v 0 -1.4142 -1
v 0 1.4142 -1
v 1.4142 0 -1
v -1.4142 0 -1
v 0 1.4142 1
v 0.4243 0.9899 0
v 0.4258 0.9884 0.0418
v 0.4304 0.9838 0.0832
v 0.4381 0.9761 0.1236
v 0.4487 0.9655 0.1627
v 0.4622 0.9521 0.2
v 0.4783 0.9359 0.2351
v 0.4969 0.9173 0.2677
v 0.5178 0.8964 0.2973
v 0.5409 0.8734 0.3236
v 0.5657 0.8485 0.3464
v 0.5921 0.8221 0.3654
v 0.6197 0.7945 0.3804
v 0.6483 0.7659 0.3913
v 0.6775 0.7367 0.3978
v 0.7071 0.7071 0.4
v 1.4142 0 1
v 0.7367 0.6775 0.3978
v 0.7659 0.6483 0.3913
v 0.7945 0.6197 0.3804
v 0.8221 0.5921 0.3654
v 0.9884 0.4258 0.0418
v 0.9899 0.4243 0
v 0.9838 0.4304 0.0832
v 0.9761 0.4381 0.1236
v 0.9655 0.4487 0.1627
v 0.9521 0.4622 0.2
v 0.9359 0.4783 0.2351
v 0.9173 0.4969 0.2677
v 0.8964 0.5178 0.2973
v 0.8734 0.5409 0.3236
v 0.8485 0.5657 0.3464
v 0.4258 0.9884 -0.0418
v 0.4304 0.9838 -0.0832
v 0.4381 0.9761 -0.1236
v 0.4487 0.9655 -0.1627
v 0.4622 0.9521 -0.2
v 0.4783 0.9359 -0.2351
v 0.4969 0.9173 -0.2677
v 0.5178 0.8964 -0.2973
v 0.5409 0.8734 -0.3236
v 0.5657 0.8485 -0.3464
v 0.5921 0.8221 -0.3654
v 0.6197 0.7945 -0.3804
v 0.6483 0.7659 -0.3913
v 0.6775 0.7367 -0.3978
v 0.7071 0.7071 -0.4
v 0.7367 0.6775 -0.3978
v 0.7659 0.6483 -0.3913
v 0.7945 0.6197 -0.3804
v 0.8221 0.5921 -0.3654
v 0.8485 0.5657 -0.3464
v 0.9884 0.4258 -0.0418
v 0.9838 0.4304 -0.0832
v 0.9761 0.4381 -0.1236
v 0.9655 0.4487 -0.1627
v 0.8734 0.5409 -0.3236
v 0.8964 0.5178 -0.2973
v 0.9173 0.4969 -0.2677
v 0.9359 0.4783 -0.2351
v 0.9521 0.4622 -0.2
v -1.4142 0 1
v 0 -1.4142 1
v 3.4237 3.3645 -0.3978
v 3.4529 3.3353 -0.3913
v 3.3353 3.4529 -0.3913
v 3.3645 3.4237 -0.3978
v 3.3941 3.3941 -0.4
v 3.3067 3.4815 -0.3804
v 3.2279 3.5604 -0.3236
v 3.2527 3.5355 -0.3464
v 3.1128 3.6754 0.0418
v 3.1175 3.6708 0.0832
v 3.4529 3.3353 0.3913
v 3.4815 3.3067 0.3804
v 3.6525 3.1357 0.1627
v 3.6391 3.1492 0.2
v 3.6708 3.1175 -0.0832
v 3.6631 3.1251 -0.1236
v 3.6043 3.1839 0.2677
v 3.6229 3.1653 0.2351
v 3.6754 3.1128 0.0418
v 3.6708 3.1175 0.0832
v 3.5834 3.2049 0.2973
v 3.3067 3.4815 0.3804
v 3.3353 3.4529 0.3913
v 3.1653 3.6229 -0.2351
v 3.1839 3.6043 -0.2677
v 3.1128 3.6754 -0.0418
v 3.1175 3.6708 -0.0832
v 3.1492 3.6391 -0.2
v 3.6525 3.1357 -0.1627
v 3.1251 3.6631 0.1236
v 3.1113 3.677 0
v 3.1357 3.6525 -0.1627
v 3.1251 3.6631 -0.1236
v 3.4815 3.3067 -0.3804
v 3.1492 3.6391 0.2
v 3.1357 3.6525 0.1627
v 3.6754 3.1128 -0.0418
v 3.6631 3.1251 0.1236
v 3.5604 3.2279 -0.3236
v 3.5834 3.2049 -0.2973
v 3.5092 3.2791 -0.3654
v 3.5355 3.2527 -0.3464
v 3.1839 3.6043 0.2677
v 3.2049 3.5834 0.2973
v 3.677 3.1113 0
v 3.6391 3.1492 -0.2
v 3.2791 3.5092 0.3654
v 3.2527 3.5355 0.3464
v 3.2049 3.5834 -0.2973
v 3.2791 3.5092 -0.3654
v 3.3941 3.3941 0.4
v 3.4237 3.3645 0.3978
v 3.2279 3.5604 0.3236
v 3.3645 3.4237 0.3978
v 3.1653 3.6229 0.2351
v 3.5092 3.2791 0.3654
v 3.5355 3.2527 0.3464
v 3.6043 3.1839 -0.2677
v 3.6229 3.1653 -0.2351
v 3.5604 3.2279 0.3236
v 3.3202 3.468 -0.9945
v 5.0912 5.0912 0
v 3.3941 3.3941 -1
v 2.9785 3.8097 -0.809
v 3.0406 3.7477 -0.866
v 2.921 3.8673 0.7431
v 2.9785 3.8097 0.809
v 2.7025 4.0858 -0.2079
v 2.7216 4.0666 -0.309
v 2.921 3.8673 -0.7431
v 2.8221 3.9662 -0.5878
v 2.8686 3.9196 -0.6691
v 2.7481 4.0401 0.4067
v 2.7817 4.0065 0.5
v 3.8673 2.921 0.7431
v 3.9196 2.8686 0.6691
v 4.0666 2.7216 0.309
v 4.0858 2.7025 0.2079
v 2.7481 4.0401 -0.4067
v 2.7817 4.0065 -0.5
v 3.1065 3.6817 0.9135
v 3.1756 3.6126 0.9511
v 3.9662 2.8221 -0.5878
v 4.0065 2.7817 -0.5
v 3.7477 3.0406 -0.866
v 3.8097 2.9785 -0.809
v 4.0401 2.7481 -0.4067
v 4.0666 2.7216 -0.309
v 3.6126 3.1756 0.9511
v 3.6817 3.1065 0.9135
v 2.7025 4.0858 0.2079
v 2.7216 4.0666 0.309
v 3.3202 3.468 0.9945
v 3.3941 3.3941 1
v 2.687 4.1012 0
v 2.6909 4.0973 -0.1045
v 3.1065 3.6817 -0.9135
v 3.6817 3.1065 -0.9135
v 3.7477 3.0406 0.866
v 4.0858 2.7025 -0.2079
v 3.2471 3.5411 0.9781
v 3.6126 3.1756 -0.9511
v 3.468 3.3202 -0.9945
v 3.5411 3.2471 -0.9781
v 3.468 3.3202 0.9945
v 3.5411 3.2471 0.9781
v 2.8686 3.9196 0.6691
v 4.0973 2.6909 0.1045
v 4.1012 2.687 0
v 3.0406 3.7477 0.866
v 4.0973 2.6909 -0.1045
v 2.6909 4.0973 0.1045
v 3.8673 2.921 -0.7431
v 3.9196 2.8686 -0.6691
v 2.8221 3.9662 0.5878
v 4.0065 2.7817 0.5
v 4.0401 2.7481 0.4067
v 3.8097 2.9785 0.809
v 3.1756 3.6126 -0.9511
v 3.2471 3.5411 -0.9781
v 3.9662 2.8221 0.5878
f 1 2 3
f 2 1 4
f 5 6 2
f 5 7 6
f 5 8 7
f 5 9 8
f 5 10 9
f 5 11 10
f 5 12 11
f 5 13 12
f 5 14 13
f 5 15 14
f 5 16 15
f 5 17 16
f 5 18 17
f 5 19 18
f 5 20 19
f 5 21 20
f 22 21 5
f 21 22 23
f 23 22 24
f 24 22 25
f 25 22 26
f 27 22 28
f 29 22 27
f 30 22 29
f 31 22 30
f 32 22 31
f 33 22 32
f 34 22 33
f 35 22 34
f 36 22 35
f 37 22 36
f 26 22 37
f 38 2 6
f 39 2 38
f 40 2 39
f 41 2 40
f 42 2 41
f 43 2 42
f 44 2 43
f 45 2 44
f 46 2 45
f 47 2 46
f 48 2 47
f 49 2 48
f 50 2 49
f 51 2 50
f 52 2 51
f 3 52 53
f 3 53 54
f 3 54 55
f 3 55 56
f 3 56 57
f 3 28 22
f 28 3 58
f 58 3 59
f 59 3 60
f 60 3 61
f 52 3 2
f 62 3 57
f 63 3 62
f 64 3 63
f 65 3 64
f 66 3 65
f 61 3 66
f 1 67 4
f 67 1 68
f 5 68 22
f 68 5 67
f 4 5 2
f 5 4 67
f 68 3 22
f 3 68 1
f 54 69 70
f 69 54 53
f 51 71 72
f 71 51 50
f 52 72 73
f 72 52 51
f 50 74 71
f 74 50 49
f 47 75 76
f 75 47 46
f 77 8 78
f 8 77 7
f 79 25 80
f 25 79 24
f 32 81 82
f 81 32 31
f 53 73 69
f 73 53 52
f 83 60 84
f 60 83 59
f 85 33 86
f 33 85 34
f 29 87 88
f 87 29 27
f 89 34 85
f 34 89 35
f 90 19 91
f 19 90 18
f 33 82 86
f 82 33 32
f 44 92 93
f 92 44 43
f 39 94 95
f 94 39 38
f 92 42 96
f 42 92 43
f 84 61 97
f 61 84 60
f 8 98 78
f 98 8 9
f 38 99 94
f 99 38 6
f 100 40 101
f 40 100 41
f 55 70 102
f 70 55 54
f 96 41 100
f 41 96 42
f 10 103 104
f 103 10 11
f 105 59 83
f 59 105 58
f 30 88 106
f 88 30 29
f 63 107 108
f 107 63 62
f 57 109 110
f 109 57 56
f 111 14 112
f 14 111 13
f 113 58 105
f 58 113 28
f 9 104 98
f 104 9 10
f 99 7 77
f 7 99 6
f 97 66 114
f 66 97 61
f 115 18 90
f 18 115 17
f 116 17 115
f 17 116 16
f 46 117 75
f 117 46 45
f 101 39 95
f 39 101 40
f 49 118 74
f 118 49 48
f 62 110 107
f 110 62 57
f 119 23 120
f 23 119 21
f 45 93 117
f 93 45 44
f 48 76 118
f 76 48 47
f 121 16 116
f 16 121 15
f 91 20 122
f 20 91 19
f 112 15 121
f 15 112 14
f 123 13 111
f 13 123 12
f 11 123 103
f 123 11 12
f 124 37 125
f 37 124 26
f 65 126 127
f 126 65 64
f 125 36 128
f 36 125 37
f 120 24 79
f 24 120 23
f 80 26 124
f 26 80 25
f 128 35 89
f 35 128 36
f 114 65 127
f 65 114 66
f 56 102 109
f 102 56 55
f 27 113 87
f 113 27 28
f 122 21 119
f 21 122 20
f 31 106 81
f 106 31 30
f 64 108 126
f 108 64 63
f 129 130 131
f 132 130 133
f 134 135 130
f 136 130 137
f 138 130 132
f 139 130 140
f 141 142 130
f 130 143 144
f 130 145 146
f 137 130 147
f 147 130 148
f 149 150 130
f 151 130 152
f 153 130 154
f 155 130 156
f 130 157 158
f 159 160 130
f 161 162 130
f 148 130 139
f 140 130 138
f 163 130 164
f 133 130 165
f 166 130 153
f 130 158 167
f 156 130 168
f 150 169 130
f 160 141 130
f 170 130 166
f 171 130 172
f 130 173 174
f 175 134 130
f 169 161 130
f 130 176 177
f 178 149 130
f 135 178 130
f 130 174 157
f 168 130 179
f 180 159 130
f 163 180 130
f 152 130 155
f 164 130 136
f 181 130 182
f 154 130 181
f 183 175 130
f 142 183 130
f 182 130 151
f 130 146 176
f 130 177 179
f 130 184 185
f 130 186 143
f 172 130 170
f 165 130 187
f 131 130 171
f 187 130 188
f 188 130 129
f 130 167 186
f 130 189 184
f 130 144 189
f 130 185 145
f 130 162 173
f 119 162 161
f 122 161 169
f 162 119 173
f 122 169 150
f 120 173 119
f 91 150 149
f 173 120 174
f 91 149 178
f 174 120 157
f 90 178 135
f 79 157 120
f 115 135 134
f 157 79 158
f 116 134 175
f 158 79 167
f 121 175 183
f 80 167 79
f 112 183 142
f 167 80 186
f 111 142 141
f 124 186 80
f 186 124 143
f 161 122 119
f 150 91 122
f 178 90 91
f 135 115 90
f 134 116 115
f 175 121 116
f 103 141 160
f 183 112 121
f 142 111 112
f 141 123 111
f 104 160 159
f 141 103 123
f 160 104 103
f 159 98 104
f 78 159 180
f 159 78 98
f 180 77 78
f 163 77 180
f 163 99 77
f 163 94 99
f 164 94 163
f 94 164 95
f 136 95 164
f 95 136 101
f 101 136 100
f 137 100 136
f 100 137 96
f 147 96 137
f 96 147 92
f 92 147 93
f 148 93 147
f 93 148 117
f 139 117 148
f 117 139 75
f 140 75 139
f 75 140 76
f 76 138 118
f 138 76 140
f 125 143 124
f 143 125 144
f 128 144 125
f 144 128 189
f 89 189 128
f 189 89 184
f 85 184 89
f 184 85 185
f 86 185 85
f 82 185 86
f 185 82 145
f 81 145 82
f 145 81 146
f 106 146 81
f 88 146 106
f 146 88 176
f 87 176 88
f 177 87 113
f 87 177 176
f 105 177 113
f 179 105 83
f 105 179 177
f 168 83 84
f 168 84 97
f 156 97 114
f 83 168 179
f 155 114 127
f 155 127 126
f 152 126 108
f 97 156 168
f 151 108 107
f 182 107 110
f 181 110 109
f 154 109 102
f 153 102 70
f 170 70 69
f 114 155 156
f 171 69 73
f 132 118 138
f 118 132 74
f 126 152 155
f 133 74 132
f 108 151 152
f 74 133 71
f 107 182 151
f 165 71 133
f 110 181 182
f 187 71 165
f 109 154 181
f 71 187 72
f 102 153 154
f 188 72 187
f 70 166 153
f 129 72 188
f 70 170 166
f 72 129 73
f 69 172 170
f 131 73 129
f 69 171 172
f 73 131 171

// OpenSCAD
module ToggleEdgeTargetIcon() {
  kL = 6;
  cube([2, 2, 2], center = true);
  translate([0, 0, kL / 2]) cylinder(r  = .4, h = kL, center = true);
  translate([0, 0,  kL]) cylinder(r1 =  1, r2 = 0, h = 2.4, center = true);
}

rotate([-45, 90, 0]) ToggleEdgeTargetIcon($fn = 60);
